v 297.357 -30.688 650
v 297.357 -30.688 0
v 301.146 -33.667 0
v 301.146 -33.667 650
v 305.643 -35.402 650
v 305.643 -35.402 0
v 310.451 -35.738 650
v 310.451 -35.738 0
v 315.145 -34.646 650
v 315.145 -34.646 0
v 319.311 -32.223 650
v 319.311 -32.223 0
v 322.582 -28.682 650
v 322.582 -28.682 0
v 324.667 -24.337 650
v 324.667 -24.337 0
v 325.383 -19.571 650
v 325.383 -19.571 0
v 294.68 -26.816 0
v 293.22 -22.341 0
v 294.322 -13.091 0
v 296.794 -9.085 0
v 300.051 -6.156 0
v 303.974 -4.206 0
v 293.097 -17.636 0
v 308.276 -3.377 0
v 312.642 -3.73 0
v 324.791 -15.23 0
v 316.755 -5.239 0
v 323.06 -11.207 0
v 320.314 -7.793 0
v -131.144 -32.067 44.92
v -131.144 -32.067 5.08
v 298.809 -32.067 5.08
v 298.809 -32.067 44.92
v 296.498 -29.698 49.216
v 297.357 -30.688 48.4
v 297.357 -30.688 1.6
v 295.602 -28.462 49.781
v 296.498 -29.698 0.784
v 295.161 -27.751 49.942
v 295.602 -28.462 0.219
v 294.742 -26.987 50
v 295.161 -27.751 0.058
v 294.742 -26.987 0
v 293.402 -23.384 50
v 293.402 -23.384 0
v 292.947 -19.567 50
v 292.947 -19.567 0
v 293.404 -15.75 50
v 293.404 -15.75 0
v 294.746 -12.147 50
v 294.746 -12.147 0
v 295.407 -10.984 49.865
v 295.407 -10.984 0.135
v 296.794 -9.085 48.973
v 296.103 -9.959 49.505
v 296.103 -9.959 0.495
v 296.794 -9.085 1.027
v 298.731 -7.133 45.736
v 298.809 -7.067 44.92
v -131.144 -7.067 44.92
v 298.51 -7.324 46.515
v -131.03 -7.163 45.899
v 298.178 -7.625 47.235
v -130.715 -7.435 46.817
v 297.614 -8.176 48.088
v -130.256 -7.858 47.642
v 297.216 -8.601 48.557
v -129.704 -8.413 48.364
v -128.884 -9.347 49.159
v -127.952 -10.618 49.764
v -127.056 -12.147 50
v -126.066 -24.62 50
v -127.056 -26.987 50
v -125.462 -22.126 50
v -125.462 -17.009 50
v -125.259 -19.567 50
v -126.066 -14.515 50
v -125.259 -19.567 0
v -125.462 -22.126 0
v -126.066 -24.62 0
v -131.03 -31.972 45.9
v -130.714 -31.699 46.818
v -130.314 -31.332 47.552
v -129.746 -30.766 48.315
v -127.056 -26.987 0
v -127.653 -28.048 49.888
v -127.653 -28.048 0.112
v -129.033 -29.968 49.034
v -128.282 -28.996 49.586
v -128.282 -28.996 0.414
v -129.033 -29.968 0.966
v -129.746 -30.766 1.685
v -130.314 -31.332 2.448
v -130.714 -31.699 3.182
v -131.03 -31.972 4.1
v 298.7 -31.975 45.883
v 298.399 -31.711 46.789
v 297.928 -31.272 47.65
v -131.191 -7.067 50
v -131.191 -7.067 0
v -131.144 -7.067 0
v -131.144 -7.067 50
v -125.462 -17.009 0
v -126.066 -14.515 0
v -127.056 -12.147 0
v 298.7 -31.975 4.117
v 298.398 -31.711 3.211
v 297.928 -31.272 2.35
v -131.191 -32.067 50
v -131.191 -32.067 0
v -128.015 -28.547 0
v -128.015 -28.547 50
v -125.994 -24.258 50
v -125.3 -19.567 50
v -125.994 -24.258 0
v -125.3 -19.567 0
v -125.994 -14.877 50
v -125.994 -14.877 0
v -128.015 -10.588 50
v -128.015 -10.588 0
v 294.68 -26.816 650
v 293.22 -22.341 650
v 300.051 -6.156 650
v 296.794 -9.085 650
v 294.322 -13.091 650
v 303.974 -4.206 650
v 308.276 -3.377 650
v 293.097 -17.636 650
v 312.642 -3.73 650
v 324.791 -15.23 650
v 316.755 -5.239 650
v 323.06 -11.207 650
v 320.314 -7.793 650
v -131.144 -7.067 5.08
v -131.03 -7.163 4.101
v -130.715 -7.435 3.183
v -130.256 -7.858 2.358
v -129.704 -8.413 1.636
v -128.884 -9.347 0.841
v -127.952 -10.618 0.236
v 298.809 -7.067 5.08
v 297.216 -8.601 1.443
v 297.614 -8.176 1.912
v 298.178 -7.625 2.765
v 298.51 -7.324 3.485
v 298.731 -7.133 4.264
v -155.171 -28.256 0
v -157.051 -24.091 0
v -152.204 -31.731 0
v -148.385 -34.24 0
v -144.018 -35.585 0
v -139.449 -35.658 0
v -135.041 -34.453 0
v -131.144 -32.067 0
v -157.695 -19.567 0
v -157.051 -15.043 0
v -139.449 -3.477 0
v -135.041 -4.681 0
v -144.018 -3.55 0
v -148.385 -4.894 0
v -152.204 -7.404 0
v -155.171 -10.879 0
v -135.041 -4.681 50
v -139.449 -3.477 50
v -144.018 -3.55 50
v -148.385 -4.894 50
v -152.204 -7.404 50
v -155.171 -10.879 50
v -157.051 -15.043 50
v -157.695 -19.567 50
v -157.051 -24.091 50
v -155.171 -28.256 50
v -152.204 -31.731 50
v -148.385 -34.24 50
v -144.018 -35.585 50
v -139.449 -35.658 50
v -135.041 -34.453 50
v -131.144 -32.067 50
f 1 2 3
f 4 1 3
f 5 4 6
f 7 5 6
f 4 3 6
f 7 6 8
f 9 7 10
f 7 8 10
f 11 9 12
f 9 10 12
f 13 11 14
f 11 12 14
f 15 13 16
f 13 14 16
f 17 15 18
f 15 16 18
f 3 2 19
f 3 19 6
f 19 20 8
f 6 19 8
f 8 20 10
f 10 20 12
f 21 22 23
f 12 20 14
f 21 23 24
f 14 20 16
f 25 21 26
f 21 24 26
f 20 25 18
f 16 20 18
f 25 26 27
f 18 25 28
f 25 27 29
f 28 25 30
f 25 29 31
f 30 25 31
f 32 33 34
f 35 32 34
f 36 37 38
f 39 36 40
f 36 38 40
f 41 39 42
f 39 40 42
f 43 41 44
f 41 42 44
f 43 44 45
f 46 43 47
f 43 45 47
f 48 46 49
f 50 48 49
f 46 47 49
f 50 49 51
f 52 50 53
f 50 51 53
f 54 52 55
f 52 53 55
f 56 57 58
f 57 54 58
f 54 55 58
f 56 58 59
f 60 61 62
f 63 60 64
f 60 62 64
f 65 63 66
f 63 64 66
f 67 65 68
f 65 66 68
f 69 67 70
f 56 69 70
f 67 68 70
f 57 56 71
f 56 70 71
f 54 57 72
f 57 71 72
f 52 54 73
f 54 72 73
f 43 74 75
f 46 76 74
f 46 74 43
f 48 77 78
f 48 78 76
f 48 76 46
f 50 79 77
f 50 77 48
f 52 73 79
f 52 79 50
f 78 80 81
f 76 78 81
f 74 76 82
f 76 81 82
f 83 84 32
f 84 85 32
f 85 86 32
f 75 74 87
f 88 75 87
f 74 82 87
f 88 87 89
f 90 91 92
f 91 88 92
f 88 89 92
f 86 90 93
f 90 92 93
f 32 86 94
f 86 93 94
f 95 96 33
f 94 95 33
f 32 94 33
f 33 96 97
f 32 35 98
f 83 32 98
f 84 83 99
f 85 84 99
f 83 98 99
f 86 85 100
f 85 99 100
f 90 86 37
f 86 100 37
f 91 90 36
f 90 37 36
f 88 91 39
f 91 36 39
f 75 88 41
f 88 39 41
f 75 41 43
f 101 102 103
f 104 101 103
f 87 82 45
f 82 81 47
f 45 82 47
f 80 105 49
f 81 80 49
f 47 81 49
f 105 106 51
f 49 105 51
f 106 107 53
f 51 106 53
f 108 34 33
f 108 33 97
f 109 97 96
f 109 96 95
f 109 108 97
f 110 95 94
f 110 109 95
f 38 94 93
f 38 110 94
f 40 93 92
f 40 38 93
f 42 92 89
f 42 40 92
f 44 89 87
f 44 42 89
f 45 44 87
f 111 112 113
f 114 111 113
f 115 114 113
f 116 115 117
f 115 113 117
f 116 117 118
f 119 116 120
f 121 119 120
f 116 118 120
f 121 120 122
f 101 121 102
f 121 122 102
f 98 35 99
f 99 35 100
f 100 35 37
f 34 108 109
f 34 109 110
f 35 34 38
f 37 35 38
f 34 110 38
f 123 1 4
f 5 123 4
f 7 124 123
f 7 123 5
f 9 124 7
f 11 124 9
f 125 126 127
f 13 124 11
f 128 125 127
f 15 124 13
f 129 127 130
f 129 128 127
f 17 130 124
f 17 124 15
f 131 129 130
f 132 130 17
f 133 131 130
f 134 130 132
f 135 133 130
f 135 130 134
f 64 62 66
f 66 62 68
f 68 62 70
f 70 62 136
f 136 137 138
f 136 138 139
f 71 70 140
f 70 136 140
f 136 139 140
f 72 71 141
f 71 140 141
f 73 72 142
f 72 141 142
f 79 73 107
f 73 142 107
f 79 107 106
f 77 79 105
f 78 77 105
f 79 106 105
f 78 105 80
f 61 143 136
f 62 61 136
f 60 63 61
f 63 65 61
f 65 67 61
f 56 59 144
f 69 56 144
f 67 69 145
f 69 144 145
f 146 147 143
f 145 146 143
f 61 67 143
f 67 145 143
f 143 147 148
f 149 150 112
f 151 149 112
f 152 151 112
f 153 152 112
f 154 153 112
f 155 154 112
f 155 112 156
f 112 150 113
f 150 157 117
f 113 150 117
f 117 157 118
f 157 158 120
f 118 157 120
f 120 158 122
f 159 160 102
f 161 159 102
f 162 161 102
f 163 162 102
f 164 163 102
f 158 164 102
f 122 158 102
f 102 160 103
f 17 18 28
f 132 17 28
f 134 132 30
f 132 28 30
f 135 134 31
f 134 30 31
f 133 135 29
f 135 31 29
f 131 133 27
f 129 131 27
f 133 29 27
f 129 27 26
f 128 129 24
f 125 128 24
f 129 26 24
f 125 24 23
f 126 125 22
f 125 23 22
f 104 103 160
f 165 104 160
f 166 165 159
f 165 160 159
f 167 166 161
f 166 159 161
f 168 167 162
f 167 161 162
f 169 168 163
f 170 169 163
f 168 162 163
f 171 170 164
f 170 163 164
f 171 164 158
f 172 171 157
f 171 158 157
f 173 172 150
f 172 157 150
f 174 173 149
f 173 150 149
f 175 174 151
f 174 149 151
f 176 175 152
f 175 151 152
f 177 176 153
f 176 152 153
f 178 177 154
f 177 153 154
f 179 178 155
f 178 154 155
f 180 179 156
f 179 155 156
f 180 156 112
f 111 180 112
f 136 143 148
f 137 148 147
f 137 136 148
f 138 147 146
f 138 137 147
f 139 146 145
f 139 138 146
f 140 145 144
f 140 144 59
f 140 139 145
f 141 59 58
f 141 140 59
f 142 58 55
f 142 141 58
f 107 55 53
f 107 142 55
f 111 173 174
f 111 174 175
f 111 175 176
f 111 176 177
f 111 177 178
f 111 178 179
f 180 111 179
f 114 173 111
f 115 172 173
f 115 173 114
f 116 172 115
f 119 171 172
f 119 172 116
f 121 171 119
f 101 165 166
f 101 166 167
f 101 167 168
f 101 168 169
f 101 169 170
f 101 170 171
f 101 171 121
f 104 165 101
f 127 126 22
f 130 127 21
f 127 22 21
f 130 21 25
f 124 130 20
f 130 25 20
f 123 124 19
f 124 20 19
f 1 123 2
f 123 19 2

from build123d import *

# Parameters (mm, degrees)
F1_DEPTH = 50
F2_DEPTH = 650
F3_R     = 5.08


with BuildPart() as f1:
    # F0 (on Top) → F1 (new body)
    with BuildSketch(Plane.XY):
        with BuildLine():
            ThreePointArc((-131.1912735713, -32.0673150737), (-125.2999405011, -19.5673150737), (-131.1912735713, -7.0673150737))
            Line((-131.1912735713, -7.0673150737), (-131.1438777998, -7.0673150737))
            ThreePointArc((-131.1438777998, -7.0673150737), (-157.6947483509, -19.5673150737), (-131.1438777998, -32.0673150737))
            Line((-131.1438777998, -32.0673150737), (-131.1912735713, -32.0673150737))
        make_face()
    extrude(amount=F1_DEPTH)


with BuildPart() as f1b:
    # F0 (on Top) → F1, piece 2 (new body)
    with BuildSketch(Plane.XY):
        with BuildLine():
            Line((298.8087264287, -7.0673150737), (-131.1438777998, -7.0673150737))
            ThreePointArc((-131.1438777998, -7.0673150737), (-126.8037545477, -12.6593053274), (-125.2589483509, -19.5673150737))
            ThreePointArc((-125.2589483509, -19.5673150737), (-126.8037545477, -26.4753248199), (-131.1438777998, -32.0673150737))
            Line((-131.1438777998, -32.0673150737), (298.8087264287, -32.0673150737))
            ThreePointArc((298.8087264287, -32.0673150737), (298.0617434777, -31.3999455205), (297.3571034719, -30.688012861))
            ThreePointArc((297.3571034719, -30.688012861), (292.9528239105, -19.9938442344), (296.7935969923, -9.084610384))
            ThreePointArc((296.7935969923, -9.084610384), (297.7570271304, -8.0318755339), (298.8087264287, -7.0673150737))
        make_face()
    extrude(amount=F1_DEPTH)

    # F3
    f3_edges = [f1b.edges().sort_by_distance(p)[0] for p in [
        (83.832424, -32.067315, 50),
        (83.832424, -7.067315, 50),
        (83.832424, -32.067315, 0),
        (83.832424, -7.067315, 0),
    ]]
    fillet(f3_edges, radius=F3_R)


with BuildPart() as f2:
    # F0 (on Top) → F2 (new body)
    with BuildSketch(Plane.XY):
        with BuildLine():
            ThreePointArc((325.3831095318, -19.5709578693), (314.749952382, -4.344962739), (296.7935969923, -9.084610384))
            ThreePointArc((296.7935969923, -9.084610384), (292.988070559, -19.9929248554), (297.3571034719, -30.688012861))
            ThreePointArc((297.3571034719, -30.688012861), (315.1450756315, -34.6461521247), (325.3831095318, -19.5709578693))
        make_face()
    extrude(amount=F2_DEPTH)


solid = Compound([f1.part, f1b.part, f2.part])
